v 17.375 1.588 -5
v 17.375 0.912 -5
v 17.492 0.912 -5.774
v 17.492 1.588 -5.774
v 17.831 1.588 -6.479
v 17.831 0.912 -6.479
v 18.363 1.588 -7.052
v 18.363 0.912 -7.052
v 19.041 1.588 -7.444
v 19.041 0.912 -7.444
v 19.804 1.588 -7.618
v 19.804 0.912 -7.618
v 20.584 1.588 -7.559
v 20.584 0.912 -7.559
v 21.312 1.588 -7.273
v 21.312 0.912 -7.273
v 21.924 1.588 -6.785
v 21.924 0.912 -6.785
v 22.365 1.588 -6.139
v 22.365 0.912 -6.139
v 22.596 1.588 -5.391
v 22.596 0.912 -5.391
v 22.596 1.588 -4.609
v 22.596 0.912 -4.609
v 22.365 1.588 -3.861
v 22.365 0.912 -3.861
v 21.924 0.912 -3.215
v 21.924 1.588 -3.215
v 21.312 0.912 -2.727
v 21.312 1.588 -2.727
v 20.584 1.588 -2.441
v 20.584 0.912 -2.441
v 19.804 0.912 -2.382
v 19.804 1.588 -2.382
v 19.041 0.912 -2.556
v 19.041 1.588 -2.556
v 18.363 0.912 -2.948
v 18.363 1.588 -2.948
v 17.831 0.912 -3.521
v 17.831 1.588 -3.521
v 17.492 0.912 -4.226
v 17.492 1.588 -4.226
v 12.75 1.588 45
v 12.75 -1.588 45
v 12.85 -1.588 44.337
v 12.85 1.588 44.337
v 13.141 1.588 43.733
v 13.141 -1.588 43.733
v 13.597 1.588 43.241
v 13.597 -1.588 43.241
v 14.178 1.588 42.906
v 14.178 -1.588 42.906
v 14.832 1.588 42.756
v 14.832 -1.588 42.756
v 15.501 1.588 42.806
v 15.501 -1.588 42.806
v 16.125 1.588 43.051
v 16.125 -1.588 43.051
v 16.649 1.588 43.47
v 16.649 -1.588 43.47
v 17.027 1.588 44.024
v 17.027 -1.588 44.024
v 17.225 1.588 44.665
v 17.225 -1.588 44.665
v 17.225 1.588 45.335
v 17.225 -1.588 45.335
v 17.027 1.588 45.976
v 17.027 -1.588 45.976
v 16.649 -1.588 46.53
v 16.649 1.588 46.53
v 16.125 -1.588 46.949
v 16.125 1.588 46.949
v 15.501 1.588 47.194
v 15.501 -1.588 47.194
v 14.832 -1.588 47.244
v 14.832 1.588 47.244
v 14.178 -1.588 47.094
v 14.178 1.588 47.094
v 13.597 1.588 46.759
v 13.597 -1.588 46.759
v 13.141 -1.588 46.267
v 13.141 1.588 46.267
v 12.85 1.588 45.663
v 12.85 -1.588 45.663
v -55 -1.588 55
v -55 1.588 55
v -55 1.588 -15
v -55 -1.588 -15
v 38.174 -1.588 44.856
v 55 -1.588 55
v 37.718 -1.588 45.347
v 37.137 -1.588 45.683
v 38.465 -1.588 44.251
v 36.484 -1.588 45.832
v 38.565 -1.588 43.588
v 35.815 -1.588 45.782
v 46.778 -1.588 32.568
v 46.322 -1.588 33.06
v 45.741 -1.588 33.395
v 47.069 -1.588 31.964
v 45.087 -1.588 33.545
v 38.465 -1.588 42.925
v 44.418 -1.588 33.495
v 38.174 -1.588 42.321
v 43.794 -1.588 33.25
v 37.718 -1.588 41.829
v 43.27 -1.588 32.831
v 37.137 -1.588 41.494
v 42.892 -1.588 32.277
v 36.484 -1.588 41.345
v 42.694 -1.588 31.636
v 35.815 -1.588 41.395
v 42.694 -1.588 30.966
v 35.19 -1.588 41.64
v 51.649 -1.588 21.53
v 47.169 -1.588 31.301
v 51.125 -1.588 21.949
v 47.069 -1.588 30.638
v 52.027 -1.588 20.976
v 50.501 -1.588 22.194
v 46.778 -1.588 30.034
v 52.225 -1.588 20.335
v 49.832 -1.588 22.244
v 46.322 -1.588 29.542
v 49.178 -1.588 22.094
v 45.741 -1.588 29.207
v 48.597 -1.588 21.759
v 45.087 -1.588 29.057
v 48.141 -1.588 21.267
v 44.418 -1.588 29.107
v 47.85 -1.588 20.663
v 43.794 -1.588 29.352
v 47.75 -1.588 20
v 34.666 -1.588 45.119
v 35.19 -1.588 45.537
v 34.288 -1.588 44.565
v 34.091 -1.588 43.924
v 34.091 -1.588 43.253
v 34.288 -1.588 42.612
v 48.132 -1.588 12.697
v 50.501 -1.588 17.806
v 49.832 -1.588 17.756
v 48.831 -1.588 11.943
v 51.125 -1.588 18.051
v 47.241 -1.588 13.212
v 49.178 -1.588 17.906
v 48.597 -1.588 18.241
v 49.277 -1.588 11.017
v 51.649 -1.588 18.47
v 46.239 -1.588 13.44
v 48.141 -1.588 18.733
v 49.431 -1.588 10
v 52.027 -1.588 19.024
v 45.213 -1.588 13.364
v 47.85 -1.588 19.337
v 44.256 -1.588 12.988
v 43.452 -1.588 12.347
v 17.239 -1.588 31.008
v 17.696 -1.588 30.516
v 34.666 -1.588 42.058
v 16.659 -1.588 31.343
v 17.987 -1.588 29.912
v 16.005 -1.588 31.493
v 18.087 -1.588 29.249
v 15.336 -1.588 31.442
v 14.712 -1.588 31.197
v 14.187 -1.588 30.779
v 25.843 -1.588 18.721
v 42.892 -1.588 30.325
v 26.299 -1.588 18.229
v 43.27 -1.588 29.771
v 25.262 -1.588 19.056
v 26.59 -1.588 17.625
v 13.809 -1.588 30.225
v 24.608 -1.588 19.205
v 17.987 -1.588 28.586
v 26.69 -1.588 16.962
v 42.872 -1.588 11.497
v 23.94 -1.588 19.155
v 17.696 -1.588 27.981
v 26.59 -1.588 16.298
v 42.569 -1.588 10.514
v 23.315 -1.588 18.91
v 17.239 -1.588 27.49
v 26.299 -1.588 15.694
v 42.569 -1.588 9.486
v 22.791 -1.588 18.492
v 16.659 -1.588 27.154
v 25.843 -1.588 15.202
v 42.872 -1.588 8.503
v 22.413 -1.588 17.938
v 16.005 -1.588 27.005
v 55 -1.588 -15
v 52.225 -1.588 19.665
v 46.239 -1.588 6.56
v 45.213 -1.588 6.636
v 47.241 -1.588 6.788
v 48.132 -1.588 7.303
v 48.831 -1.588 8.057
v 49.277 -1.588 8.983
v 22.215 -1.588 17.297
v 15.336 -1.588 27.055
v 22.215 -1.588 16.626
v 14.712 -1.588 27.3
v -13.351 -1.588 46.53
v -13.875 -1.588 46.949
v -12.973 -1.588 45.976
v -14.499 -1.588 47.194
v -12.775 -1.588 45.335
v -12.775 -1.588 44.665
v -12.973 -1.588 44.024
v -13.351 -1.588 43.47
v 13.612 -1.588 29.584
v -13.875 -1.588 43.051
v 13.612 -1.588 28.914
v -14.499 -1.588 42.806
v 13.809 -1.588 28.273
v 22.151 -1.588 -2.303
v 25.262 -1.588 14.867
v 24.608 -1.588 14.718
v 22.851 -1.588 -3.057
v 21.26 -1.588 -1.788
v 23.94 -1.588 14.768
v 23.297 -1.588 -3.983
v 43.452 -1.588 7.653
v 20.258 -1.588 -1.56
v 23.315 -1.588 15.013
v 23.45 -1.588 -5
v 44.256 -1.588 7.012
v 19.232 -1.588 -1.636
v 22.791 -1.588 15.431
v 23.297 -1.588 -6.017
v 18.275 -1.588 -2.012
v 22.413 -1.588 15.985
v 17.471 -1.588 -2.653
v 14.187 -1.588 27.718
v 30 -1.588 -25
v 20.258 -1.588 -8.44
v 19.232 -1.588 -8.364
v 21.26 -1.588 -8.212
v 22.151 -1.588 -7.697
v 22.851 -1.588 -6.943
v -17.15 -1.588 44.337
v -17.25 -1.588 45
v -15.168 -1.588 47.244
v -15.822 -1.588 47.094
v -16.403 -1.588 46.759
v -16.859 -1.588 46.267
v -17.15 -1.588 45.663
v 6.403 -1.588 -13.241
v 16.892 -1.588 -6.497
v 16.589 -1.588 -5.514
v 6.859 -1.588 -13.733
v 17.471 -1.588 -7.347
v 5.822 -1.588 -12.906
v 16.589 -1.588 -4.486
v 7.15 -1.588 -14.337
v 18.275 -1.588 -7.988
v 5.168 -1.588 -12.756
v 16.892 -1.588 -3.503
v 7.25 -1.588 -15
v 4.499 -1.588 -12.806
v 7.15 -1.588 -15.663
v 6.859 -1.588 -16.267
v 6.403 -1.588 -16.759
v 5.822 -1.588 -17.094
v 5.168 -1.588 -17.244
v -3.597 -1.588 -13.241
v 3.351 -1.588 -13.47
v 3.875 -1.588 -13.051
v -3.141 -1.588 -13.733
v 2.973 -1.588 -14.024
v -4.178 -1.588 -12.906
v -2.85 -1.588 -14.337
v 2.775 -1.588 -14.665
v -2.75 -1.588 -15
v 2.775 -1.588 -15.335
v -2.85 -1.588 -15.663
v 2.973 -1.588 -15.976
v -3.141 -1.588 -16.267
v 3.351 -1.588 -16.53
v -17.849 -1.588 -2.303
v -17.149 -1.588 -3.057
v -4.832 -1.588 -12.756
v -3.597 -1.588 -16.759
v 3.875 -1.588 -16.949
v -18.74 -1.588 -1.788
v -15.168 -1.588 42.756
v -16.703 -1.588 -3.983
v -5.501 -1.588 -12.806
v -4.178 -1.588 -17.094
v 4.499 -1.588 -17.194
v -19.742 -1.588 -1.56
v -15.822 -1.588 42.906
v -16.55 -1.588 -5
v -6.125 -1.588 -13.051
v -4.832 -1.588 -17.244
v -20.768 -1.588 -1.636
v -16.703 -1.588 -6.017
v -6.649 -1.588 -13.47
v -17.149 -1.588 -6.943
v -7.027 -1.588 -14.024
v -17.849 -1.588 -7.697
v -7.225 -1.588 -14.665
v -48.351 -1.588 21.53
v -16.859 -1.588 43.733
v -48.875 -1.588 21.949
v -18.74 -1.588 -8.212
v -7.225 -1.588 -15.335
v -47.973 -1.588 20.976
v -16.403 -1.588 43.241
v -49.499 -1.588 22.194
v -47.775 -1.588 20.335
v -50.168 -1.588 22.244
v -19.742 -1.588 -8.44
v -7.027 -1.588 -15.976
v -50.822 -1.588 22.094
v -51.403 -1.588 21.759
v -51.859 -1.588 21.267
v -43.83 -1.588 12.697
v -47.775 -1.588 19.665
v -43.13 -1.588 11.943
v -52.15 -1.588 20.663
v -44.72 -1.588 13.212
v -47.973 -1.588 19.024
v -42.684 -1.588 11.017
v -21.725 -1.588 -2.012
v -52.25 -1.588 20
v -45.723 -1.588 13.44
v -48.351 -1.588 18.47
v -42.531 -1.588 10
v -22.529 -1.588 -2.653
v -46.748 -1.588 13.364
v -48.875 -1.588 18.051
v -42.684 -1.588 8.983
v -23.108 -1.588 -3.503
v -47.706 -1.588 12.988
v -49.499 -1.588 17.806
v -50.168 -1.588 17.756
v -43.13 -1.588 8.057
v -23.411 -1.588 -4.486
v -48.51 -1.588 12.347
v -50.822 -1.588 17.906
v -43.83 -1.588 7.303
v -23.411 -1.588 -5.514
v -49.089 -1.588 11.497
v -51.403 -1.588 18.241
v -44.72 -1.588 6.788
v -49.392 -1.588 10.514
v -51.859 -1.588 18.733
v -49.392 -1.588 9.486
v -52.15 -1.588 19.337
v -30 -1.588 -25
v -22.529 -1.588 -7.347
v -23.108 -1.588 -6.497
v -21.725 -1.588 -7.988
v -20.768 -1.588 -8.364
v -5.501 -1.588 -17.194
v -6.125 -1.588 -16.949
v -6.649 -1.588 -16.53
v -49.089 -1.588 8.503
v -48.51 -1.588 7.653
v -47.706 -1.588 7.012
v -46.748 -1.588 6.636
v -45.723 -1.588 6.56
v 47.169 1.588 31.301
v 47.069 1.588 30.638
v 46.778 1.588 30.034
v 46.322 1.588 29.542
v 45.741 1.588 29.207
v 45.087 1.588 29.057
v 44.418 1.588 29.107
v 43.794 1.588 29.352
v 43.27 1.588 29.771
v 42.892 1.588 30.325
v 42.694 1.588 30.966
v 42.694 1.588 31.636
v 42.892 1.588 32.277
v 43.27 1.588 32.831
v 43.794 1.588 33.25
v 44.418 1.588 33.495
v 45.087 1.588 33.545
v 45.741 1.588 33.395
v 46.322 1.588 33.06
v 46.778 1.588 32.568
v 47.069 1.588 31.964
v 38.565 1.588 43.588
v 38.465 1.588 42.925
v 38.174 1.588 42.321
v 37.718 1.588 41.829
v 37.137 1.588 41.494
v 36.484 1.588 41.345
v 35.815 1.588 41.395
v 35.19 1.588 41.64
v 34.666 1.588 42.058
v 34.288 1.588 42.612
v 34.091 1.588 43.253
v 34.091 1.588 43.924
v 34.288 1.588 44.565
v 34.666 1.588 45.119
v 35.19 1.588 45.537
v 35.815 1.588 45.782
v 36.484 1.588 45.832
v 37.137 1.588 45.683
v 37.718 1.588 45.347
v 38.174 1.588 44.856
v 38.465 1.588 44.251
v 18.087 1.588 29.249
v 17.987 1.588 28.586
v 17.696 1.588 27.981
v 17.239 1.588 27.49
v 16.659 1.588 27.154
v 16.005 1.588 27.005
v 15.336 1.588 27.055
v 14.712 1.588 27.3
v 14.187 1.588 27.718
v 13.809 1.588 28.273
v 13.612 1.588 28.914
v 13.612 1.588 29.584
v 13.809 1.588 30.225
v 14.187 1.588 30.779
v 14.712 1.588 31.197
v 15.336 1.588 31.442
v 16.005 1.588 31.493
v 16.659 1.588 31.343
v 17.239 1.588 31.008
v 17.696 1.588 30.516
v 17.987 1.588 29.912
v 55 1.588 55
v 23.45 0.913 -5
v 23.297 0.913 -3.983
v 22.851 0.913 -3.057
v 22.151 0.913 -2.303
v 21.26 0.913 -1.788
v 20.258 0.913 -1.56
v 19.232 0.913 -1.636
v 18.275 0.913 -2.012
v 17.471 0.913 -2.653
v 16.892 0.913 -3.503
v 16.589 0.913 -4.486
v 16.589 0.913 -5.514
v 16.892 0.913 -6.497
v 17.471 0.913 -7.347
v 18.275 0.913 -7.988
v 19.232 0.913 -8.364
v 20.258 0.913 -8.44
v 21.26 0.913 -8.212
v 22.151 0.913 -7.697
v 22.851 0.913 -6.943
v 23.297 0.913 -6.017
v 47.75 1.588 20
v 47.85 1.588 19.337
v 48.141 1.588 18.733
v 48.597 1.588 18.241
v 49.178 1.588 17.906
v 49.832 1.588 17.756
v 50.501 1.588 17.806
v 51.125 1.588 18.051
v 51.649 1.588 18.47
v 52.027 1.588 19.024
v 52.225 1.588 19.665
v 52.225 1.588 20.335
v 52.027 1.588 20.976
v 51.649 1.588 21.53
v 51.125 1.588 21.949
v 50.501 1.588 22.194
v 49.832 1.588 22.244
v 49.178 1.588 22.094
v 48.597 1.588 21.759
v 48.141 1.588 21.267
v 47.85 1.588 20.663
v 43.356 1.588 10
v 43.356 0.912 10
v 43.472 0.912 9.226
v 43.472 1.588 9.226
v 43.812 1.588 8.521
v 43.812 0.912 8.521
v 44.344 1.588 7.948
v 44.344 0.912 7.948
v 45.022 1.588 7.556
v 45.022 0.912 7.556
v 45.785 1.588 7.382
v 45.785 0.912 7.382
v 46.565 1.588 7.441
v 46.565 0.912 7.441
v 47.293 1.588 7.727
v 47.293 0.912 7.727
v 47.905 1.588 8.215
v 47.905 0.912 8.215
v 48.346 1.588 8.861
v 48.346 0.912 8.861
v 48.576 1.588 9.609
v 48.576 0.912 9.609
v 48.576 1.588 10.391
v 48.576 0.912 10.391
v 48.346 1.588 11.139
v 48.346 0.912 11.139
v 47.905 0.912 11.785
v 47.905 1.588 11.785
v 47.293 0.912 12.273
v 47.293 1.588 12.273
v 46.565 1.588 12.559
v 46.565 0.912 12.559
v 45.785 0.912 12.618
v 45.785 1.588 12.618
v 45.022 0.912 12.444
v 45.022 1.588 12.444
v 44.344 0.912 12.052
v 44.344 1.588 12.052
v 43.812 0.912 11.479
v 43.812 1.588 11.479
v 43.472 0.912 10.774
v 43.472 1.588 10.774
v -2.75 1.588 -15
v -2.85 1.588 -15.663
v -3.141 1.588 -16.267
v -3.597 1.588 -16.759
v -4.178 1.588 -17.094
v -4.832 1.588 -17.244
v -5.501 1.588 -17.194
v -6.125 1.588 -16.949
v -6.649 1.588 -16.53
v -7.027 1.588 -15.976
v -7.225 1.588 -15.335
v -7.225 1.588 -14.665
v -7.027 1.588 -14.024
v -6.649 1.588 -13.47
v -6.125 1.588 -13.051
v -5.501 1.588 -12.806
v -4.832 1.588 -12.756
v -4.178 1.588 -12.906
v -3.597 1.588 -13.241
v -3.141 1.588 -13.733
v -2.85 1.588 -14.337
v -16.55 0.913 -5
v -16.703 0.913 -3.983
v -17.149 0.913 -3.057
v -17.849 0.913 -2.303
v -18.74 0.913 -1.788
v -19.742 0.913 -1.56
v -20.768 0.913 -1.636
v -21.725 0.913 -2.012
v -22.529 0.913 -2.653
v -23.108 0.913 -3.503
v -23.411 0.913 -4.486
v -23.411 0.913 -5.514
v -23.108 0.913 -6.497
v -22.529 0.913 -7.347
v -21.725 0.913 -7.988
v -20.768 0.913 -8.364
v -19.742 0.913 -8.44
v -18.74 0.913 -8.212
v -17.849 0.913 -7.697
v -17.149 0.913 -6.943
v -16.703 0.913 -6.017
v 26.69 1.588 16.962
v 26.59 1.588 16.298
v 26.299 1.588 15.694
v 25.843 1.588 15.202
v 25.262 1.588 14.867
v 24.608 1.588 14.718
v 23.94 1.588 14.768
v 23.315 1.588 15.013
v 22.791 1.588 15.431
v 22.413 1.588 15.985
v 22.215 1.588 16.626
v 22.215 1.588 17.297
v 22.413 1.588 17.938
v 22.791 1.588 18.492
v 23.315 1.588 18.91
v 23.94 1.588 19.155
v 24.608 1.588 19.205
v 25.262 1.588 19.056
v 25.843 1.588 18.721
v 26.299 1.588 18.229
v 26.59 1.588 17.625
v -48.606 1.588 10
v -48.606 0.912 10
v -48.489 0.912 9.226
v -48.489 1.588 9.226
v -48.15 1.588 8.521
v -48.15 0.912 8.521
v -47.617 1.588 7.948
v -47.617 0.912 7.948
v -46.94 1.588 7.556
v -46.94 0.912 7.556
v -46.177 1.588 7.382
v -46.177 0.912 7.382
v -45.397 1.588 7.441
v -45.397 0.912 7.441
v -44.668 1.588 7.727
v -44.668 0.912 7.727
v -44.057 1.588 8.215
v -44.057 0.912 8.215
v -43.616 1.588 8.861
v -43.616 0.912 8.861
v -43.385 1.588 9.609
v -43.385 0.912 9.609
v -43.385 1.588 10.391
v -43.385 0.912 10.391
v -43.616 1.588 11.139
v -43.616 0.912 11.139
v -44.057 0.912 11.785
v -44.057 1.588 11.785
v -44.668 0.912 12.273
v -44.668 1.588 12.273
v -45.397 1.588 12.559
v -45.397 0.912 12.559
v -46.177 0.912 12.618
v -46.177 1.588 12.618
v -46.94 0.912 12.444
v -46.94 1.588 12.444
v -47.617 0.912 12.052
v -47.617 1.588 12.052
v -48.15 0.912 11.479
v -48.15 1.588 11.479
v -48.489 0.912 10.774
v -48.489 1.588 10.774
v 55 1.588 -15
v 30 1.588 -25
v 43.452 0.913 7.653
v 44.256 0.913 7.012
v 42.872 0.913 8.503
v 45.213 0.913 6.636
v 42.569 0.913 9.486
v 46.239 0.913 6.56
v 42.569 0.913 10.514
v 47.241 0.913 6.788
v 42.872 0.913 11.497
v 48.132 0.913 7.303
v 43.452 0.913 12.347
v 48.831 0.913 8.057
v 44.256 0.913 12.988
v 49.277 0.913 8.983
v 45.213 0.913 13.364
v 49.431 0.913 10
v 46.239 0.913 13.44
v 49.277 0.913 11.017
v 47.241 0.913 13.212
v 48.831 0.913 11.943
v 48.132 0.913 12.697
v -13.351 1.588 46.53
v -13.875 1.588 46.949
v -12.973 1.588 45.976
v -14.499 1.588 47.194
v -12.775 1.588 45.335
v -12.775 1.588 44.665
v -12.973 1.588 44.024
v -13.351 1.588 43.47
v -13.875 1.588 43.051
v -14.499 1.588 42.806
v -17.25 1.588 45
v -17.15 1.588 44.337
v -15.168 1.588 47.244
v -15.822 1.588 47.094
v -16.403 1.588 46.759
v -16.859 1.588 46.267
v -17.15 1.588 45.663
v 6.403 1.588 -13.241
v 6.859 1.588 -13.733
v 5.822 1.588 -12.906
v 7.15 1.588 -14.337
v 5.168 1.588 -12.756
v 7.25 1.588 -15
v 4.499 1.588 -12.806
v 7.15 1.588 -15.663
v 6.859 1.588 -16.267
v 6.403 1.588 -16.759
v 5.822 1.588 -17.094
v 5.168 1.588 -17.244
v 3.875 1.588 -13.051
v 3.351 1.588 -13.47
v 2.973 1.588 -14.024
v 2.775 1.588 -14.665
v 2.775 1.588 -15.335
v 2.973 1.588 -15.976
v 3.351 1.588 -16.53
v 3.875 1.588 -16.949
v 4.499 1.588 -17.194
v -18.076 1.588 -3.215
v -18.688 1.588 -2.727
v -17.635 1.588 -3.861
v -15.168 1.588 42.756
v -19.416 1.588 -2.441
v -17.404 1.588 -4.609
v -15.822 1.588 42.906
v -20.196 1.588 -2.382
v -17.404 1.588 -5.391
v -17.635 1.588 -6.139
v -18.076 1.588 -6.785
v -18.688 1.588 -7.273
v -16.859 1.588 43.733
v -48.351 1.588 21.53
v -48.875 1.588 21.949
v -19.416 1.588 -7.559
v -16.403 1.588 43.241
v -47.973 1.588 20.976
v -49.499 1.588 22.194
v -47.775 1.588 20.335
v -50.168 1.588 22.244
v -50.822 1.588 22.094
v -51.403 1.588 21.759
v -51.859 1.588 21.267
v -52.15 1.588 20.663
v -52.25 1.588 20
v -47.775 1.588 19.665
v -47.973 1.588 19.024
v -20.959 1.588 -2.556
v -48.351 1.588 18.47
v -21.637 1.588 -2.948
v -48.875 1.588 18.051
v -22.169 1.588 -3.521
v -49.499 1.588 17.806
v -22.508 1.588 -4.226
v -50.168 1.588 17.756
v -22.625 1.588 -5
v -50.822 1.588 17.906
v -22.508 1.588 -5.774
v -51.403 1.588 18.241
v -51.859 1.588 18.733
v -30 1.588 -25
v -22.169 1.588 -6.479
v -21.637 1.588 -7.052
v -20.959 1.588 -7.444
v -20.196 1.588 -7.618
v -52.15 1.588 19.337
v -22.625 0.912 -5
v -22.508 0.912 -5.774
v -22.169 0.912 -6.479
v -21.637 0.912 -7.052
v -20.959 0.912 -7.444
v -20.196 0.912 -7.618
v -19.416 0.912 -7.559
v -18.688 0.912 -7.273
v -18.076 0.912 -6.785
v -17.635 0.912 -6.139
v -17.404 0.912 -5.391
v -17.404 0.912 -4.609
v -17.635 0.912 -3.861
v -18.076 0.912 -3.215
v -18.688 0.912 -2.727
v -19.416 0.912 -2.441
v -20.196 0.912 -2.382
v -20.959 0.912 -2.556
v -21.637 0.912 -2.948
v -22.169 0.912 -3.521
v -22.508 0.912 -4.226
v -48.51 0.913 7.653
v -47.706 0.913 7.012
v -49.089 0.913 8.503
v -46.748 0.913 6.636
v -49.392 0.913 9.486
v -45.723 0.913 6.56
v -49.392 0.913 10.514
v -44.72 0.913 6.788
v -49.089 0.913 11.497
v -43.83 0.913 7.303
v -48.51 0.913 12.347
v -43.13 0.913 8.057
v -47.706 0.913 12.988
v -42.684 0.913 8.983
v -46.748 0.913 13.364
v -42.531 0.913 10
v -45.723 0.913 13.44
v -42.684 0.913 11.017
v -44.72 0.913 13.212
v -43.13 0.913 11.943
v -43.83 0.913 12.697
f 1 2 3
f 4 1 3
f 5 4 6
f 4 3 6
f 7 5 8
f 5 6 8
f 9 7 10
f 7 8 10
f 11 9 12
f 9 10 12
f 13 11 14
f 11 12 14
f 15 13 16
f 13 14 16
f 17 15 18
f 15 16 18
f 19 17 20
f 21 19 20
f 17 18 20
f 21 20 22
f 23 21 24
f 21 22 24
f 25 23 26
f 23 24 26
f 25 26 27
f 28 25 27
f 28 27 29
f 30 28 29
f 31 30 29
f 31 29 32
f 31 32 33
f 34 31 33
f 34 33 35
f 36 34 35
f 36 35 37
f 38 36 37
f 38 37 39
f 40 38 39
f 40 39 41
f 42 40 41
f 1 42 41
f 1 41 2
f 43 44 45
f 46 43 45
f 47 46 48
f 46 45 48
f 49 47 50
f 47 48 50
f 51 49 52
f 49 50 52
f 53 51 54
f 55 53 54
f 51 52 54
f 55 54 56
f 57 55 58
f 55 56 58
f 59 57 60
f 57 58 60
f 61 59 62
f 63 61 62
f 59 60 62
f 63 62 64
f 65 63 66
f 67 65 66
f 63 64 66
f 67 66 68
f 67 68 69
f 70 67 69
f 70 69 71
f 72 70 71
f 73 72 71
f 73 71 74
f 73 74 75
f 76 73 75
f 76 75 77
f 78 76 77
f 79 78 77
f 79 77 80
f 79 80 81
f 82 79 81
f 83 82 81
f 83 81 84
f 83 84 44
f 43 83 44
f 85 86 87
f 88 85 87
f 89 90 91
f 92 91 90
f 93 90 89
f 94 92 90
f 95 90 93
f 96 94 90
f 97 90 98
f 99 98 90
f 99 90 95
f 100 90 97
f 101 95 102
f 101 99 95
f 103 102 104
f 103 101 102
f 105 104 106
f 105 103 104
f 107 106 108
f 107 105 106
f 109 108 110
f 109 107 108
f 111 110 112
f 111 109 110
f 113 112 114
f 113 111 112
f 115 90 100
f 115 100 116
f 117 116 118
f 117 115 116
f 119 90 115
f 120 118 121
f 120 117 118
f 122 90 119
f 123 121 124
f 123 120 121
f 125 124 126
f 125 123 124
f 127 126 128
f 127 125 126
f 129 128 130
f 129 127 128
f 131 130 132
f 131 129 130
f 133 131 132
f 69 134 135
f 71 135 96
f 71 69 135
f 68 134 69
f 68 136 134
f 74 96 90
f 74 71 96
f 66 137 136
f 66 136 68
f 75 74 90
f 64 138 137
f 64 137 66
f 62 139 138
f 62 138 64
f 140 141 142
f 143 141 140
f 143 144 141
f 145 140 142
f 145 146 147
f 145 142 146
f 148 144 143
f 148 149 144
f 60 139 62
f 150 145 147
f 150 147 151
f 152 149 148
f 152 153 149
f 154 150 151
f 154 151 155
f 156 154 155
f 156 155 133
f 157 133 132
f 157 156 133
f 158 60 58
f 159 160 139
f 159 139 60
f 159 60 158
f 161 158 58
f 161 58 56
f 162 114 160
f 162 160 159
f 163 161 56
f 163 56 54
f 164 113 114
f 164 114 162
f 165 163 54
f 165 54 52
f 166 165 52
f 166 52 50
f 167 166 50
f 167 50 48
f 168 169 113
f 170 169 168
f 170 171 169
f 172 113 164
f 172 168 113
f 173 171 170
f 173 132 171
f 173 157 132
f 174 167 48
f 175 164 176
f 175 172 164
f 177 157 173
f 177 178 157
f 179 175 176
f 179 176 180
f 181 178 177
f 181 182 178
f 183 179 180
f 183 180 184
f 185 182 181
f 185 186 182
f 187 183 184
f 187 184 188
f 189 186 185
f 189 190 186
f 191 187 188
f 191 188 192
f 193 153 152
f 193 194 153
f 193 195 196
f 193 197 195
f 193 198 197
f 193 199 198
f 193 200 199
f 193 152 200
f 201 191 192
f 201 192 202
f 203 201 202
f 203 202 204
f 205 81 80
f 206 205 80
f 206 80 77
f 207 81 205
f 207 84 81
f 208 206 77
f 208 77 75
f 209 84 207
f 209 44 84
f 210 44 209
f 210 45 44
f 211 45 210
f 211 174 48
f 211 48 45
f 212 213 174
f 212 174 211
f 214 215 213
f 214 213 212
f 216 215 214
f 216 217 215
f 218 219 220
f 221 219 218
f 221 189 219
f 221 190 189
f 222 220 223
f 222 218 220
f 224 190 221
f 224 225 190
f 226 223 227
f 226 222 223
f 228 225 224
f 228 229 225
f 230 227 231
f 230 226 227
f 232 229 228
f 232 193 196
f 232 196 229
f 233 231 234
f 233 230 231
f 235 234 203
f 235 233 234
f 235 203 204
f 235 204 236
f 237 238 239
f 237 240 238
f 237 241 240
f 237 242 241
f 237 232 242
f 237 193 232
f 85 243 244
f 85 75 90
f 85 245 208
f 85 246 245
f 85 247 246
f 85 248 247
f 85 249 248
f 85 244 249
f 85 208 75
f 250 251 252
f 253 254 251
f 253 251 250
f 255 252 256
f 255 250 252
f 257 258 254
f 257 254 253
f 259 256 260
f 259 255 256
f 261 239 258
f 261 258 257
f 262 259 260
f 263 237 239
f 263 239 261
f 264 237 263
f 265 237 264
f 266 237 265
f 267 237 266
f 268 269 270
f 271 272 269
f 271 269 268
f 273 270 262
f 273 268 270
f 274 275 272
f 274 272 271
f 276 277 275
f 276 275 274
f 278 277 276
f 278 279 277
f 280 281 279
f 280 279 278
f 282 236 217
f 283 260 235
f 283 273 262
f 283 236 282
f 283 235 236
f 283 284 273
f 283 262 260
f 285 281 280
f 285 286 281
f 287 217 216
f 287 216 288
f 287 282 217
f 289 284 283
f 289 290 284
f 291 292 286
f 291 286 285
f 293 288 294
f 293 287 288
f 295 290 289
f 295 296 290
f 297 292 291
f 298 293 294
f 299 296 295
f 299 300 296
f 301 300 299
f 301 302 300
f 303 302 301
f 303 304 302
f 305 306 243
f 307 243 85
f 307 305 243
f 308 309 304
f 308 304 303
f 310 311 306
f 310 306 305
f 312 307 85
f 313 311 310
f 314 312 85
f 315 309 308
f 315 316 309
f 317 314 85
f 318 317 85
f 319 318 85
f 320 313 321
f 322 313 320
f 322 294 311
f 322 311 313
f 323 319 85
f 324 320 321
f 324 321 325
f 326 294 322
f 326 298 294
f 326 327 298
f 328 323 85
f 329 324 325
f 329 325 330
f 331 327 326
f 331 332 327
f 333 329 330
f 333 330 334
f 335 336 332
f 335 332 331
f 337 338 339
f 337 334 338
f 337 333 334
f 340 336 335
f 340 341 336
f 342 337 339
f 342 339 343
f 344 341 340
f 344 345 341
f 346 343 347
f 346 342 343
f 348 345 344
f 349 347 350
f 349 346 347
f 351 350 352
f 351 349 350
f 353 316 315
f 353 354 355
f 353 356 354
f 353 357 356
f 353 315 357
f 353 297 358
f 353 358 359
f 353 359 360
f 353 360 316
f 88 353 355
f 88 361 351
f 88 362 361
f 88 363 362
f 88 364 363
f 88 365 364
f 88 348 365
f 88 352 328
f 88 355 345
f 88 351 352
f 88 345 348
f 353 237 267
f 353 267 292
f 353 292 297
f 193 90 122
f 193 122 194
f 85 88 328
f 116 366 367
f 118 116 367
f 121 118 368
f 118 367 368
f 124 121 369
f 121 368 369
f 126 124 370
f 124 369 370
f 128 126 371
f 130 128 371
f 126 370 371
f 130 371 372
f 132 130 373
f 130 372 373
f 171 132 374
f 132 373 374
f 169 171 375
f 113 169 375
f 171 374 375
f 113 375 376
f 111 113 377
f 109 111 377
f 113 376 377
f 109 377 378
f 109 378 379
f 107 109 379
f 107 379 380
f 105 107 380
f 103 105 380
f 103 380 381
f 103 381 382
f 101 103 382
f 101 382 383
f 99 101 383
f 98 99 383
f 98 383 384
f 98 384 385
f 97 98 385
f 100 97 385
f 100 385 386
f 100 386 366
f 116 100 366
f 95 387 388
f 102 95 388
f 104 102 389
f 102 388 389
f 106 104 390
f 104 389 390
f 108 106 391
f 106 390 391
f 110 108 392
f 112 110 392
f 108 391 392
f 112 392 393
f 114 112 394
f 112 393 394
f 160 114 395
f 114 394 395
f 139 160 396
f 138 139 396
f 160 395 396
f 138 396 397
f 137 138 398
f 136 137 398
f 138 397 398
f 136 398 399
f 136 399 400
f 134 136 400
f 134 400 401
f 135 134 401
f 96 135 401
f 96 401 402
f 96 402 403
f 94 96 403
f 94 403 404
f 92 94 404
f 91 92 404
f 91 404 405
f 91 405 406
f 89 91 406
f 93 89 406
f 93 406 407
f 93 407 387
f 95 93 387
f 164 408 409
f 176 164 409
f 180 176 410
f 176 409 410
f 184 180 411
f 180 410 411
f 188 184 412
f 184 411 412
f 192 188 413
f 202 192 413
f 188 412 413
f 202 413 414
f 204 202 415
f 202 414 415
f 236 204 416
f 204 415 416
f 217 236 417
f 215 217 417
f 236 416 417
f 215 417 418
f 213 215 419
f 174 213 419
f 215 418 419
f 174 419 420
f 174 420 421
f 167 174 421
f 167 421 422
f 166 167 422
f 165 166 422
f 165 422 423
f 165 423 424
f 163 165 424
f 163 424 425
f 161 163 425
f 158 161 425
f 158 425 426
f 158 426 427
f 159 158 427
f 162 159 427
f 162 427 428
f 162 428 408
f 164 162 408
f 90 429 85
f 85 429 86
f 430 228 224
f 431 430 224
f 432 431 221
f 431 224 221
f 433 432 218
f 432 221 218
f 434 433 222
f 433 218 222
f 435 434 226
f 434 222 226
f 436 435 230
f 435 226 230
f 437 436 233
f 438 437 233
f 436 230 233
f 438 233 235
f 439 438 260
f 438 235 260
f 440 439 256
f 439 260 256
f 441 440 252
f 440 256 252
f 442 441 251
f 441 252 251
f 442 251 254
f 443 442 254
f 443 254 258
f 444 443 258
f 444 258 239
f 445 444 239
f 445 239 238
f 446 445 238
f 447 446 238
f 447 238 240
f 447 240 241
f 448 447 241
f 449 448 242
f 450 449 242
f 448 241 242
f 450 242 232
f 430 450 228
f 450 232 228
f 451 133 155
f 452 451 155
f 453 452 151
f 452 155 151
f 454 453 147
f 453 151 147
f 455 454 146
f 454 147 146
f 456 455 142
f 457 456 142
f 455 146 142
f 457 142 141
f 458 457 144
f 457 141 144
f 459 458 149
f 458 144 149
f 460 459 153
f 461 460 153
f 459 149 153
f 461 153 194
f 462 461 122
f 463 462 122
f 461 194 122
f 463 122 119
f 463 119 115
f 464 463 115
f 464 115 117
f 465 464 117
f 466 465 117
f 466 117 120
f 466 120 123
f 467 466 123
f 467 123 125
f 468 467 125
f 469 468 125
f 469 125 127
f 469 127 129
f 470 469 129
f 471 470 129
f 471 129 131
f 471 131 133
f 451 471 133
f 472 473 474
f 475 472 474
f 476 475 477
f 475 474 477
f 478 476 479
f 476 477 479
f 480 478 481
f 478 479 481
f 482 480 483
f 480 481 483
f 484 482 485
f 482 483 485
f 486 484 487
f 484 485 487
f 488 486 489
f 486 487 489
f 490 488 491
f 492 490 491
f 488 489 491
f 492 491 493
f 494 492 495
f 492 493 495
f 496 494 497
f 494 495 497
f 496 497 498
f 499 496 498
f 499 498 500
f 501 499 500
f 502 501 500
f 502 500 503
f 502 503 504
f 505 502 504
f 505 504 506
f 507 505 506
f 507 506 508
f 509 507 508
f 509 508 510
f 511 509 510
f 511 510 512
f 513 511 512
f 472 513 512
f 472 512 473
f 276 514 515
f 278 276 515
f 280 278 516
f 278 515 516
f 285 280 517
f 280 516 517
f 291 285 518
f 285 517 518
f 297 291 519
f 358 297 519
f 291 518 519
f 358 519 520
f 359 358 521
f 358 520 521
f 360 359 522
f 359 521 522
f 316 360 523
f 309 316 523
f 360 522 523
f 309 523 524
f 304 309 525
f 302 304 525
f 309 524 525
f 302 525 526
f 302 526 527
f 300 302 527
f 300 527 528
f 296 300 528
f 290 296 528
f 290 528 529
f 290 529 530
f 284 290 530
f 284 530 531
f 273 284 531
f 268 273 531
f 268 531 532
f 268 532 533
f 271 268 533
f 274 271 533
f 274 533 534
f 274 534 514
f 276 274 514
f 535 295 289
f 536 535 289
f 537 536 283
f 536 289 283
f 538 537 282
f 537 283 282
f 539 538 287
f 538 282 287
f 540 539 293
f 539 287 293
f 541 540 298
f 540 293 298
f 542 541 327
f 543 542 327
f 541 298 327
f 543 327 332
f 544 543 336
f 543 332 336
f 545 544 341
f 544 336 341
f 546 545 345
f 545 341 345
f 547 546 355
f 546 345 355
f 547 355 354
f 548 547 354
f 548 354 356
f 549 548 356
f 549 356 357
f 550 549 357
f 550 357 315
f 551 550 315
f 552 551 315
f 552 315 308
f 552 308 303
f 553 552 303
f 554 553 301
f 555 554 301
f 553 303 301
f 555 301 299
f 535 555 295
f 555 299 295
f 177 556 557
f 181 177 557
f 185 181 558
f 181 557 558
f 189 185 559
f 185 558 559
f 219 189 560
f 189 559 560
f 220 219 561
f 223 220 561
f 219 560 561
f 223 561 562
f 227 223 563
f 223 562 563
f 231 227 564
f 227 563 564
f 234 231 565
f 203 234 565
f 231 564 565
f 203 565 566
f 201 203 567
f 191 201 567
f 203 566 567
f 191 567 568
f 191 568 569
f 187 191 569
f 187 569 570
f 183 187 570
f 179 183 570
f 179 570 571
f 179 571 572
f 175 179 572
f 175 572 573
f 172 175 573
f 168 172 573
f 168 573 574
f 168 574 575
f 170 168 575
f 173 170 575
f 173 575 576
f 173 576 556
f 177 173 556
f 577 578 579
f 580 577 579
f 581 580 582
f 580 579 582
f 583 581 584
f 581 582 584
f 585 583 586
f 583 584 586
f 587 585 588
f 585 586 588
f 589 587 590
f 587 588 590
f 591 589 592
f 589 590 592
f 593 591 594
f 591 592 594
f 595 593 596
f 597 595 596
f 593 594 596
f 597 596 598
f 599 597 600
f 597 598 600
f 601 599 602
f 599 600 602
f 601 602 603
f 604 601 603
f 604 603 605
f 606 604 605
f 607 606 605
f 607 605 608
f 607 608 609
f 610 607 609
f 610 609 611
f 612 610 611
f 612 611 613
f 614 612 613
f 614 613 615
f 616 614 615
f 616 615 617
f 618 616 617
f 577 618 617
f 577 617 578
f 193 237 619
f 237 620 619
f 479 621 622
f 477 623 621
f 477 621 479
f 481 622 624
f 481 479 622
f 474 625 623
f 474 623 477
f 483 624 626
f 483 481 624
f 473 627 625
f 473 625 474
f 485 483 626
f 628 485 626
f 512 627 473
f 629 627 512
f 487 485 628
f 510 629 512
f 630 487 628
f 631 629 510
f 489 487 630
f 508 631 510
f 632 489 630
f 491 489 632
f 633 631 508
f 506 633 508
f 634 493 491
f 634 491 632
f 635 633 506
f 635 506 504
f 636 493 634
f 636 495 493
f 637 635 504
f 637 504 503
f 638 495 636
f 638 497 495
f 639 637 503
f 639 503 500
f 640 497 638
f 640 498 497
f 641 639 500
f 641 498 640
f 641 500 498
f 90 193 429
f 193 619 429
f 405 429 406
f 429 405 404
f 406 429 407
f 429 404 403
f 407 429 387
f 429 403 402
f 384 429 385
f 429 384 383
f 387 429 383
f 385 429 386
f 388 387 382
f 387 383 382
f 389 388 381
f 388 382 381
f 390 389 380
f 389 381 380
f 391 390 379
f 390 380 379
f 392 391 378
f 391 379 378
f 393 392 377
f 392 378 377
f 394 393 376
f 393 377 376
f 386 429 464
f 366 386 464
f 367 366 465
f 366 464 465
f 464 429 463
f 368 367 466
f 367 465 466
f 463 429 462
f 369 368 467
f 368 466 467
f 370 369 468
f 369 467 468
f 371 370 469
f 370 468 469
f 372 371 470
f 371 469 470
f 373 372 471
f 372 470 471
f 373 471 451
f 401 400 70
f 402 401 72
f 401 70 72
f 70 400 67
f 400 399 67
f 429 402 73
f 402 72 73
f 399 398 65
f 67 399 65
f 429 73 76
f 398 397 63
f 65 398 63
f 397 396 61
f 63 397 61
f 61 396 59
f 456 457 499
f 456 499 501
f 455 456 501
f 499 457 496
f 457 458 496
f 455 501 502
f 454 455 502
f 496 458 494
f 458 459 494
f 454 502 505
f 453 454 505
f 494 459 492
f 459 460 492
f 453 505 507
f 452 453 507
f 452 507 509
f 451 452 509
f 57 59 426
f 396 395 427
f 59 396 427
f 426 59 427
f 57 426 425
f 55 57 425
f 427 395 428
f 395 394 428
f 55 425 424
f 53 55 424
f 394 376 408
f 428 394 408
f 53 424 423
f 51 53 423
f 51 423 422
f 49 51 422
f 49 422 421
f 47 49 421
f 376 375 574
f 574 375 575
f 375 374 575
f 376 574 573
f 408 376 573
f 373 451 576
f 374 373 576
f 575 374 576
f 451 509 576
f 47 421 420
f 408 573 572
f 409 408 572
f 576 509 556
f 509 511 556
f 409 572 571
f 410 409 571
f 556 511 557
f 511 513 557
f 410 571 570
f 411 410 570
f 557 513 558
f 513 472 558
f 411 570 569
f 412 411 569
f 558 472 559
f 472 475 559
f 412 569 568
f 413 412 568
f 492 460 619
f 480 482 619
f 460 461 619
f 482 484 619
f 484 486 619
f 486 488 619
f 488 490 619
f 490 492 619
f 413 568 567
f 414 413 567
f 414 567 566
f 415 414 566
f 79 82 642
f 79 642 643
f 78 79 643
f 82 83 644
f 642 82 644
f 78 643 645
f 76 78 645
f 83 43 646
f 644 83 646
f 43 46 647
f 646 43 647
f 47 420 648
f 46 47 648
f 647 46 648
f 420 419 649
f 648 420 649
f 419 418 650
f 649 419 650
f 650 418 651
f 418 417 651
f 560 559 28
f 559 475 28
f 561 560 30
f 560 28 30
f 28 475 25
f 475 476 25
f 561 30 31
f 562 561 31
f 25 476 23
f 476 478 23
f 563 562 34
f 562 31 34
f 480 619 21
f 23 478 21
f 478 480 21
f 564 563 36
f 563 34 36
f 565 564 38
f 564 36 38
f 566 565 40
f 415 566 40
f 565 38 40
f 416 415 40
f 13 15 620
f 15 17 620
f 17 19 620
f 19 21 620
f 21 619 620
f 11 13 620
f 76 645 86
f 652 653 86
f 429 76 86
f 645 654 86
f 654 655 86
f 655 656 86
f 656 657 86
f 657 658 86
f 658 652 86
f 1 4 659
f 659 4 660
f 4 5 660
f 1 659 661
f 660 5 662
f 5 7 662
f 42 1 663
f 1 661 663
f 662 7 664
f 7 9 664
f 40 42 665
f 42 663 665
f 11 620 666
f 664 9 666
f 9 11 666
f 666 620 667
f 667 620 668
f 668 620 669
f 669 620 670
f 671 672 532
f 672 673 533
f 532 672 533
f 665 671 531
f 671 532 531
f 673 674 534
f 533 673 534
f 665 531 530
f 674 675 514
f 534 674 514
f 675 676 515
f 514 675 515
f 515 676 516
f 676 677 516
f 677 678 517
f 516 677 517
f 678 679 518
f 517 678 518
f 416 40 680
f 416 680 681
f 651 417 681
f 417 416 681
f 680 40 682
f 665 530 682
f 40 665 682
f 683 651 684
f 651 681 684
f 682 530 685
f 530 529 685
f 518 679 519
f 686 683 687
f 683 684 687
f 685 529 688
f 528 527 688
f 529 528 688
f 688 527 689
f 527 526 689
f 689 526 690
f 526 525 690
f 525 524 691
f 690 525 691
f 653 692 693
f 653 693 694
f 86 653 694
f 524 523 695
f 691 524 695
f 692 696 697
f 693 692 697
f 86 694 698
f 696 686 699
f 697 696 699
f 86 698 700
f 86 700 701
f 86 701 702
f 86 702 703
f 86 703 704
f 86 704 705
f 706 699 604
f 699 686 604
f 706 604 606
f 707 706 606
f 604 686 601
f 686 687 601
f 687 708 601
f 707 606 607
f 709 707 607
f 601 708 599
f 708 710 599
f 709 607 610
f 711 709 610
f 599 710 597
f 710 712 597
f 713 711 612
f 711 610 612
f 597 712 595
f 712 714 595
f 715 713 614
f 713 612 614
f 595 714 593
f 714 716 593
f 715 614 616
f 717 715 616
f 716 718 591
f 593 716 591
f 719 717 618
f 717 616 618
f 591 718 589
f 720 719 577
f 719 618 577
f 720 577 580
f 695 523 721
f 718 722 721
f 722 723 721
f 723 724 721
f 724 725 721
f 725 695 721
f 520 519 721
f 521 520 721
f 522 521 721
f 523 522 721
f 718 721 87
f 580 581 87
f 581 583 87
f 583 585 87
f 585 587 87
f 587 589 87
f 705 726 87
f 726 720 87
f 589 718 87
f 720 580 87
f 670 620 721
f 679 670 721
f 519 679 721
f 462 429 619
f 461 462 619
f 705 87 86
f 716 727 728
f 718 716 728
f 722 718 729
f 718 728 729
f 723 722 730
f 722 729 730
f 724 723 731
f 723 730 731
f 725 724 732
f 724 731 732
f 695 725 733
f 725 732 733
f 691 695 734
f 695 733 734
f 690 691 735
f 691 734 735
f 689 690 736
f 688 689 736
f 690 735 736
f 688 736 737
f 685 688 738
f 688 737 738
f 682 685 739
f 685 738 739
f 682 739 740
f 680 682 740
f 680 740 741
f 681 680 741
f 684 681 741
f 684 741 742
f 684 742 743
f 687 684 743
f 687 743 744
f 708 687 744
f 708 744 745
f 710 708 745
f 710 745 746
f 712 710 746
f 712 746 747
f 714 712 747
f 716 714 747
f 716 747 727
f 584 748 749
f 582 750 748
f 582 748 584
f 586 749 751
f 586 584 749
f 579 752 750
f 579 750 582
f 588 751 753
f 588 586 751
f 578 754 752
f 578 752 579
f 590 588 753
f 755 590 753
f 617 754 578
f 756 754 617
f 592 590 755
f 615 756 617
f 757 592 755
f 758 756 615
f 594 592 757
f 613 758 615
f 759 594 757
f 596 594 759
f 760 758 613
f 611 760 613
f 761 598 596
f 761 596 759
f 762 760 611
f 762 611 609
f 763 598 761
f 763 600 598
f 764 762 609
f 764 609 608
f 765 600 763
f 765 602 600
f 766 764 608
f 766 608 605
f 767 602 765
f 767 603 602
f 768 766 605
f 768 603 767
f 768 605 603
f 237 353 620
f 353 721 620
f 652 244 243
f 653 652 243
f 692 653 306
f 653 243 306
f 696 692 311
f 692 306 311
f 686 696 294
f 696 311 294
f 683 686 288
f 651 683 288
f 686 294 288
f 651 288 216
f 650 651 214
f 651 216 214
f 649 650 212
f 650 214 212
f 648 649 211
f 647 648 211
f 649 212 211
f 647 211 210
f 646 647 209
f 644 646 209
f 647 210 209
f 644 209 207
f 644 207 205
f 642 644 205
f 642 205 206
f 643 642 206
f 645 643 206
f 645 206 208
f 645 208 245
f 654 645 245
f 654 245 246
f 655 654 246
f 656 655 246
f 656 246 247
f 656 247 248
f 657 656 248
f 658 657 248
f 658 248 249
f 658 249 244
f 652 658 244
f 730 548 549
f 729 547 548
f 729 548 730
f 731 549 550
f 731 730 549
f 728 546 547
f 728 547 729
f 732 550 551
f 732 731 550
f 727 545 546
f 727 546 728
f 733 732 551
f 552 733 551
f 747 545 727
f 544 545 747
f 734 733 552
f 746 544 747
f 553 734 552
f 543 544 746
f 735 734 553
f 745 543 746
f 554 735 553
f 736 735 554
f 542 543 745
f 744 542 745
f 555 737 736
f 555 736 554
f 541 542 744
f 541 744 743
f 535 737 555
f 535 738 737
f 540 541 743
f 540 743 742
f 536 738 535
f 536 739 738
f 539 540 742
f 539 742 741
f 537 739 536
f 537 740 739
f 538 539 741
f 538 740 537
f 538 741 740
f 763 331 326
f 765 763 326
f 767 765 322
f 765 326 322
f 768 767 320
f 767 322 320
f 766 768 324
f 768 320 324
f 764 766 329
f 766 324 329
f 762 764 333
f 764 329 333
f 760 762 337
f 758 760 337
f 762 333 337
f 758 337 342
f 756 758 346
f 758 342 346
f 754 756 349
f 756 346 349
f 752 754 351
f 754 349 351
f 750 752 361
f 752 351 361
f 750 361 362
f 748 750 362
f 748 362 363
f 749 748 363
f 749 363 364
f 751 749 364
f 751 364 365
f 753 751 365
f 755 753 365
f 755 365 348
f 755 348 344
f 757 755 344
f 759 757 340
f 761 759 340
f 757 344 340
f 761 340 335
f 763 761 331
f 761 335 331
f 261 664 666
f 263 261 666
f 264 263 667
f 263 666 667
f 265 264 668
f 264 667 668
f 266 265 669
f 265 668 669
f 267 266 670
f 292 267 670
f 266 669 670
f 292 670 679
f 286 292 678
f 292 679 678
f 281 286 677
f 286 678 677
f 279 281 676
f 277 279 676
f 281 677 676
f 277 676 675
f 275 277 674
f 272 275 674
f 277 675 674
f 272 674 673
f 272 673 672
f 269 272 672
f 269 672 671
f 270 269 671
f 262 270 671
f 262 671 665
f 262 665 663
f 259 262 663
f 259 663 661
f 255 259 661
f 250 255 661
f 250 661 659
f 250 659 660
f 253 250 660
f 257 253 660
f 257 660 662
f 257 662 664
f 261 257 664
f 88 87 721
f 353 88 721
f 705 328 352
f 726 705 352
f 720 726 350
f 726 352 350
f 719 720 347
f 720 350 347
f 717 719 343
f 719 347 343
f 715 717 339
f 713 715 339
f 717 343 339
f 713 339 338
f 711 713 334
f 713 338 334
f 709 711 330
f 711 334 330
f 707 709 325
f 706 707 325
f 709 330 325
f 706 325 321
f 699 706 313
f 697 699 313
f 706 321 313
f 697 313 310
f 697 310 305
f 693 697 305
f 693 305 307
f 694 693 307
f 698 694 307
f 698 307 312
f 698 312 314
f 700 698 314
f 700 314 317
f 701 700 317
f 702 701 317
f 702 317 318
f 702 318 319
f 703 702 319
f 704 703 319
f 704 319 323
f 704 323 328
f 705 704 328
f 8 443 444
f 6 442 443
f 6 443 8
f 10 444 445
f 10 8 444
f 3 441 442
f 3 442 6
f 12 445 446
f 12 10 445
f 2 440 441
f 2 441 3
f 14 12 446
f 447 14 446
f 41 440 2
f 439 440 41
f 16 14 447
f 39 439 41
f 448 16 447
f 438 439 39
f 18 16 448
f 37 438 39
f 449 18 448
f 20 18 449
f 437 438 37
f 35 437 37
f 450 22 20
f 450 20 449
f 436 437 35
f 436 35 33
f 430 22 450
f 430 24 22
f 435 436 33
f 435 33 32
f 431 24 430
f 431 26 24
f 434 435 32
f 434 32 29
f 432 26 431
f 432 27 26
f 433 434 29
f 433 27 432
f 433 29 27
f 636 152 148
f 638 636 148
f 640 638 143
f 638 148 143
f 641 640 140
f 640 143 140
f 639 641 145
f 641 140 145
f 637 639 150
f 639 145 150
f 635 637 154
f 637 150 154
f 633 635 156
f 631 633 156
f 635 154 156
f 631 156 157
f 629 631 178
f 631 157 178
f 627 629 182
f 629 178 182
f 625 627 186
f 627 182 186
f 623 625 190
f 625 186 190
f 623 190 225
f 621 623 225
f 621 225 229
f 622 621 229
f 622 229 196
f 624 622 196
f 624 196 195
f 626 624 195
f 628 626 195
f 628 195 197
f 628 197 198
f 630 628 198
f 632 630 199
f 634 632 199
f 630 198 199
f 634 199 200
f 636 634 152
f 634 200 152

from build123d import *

# Parameters (mm, degrees)
BOSS_EXTRUDE1_DEPTH   = 1.5875
F_1_0MM_DOWEL_HOLE1_D = 5.25
SKETCH6_R             = 3.45
CUT_EXTRUDE2_DEPTH    = 2.5
M4_CLEARANCE_HOLE1_D  = 4.5
M4_CLEARANCE_HOLE2_D  = 4.5
M4_CLEARANCE_HOLE3_D  = 4.5
M4_CLEARANCE_HOLE4_D  = 4.5


with BuildPart() as part:
    # Sketch1 → Boss-Extrude1 (new body, symmetric)
    with BuildSketch(Plane(origin=(0, 0, 0), x_dir=(1, 0, 0), z_dir=(0, 1, 0))):
        Polygon((-55, 15), (-30, 25), (30, 25), (55, 15), (55, -55), (-55, -55), align=None)
    extrude(amount=BOSS_EXTRUDE1_DEPTH, both=True)

    # Ø1.0mm Dowel Hole1 (through all)
    with Locations(Plane(origin=(0, 1.5875, 0), x_dir=(1, 0, 0), z_dir=(0, 1, 0))):
        with Locations((-20, 5), (20, 5), (45.980762114, -10), (-45.980762114, -10)):
            Hole(F_1_0MM_DOWEL_HOLE1_D / 2)

    # Sketch6 → Cut-Extrude2 (cut)
    with BuildSketch(Plane.XZ.offset(1.5875)):
        with Locations((-45.980762114, 10)):
            Circle(SKETCH6_R)
        with Locations((-20, -5)):
            Circle(SKETCH6_R)
        with Locations((20, -5)):
            Circle(SKETCH6_R)
        with Locations((45.980762114, 10)):
            Circle(SKETCH6_R)
    extrude(amount=-CUT_EXTRUDE2_DEPTH, mode=Mode.SUBTRACT)

    # M4 Clearance Hole1 (through all)
    with Locations(Plane(origin=(0, -1.5875, 0), x_dir=(-1, 0, 0), z_dir=(0, -1, 0))):
        with Locations((-24.440273443, -16.961605049), (-15.836626898, -29.248885713), (-44.91907455, -31.301015958), (-36.315428005, -43.588296622)):
            Hole(M4_CLEARANCE_HOLE1_D / 2)

    # M4 Clearance Hole2 (through all)
    with Locations(Plane(origin=(0, -1.5875, 0), x_dir=(-1, 0, 0), z_dir=(0, -1, 0))):
        with Locations((-5, 15), (5, 15)):
            Hole(M4_CLEARANCE_HOLE2_D / 2)

    # M4 Clearance Hole3 (through all)
    with Locations(Plane(origin=(0, 1.5875, 0), x_dir=(1, 0, 0), z_dir=(0, 1, 0))):
        with Locations((-15, -45), (15, -45)):
            Hole(M4_CLEARANCE_HOLE3_D / 2)

    # M4 Clearance Hole4 (through all)
    with Locations(Plane(origin=(0, 1.5875, 0), x_dir=(1, 0, 0), z_dir=(0, 1, 0))):
        with Locations((50, -20), (-50, -20)):
            Hole(M4_CLEARANCE_HOLE4_D / 2)


solid = part.part
